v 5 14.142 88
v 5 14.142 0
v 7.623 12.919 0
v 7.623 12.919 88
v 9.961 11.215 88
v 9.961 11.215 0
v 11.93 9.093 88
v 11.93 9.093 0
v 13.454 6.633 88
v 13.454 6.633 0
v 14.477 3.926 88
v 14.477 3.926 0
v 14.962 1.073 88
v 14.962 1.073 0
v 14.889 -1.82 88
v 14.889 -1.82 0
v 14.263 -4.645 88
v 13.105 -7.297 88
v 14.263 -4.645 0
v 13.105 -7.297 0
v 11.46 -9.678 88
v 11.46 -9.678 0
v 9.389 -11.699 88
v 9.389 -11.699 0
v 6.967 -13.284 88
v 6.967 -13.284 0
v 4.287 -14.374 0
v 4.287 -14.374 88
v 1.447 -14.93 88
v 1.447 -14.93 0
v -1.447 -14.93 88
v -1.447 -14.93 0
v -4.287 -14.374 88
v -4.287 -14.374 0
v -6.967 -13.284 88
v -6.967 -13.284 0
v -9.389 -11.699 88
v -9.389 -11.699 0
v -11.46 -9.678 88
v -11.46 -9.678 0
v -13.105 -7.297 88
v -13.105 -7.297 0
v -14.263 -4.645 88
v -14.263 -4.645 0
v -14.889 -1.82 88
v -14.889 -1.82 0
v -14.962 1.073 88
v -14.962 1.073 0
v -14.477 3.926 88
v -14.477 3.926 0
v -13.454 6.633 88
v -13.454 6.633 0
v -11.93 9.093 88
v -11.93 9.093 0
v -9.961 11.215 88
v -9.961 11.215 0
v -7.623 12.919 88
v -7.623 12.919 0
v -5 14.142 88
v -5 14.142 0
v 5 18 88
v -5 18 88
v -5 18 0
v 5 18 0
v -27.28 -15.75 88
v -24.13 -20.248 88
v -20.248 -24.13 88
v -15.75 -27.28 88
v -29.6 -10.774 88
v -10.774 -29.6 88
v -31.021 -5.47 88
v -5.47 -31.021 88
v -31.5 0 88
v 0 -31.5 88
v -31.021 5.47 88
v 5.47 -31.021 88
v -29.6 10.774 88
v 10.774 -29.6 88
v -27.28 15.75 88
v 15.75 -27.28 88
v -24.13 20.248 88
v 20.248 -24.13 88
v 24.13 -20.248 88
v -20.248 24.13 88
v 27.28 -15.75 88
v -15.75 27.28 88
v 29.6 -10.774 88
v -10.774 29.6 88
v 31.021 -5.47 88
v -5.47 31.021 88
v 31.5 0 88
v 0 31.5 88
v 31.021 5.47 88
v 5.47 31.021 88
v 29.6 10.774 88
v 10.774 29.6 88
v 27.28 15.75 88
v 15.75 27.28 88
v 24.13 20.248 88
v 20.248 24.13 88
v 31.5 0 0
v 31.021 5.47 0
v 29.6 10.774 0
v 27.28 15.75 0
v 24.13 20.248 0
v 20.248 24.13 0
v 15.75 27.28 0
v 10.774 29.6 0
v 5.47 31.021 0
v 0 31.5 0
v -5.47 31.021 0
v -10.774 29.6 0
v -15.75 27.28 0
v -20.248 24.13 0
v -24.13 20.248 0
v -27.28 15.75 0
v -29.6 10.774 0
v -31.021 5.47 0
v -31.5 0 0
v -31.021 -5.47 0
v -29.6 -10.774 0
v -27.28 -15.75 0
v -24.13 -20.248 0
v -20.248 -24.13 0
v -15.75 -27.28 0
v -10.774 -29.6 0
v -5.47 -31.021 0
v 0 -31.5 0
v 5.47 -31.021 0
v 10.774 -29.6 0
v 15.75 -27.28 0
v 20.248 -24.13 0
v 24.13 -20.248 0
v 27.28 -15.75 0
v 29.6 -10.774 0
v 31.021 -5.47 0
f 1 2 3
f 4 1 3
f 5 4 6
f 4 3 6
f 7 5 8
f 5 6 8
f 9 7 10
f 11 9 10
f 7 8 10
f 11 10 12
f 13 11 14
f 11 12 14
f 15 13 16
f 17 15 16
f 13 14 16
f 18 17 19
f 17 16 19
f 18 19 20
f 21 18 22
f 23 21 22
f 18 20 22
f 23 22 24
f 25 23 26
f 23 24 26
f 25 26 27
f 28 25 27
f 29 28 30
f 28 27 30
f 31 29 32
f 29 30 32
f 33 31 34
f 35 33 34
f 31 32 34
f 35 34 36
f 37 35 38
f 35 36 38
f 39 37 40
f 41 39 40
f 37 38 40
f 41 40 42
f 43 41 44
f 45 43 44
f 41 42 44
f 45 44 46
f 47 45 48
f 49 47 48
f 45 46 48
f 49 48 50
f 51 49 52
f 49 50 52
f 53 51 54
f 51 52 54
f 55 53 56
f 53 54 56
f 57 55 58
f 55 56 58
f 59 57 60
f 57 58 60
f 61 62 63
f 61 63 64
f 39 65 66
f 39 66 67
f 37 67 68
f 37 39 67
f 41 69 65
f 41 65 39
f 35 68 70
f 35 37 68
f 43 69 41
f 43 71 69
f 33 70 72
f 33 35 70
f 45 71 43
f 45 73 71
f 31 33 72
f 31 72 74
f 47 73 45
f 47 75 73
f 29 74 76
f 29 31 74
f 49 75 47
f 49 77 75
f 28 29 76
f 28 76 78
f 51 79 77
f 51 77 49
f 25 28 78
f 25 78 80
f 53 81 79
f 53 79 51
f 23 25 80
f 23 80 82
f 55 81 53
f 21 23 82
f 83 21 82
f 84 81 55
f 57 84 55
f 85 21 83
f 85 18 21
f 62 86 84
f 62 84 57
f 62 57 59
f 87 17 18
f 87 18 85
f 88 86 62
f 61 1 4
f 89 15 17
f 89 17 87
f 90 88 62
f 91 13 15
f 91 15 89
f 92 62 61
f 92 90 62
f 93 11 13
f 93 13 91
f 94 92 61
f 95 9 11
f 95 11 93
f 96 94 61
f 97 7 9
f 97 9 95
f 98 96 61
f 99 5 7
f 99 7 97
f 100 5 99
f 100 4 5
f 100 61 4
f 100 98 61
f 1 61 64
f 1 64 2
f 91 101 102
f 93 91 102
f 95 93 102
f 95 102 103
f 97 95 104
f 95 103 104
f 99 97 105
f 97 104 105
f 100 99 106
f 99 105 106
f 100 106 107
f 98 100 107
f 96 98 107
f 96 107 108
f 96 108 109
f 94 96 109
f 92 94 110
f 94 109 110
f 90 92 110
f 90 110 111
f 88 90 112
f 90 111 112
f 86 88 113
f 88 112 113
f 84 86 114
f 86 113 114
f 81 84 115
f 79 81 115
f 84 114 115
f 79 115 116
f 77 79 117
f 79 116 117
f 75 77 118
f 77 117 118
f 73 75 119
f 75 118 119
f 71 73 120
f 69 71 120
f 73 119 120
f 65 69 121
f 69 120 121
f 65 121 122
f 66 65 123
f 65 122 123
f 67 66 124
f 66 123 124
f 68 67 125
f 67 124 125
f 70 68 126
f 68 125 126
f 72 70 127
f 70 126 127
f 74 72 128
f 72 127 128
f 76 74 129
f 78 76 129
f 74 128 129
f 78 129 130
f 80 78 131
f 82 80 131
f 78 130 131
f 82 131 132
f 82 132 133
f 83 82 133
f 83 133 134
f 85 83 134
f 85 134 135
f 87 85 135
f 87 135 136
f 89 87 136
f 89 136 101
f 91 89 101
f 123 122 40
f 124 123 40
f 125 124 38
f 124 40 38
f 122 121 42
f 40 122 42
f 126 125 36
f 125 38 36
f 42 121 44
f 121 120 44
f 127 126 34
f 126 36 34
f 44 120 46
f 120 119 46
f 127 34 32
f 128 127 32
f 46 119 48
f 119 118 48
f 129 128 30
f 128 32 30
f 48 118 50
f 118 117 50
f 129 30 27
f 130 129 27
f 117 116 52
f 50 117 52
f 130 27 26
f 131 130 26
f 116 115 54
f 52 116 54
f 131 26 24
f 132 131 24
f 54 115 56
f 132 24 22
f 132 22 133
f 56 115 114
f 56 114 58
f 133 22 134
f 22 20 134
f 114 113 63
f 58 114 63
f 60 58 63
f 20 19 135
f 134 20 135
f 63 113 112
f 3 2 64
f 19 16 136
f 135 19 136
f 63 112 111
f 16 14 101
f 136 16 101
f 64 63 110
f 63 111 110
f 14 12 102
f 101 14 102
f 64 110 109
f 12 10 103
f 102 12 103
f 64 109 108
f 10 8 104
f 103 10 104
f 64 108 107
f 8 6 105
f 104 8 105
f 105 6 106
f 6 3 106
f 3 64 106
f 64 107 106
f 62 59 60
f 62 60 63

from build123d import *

# Parameters (mm, degrees)
SKETCH1_R           = 31.5
BOSS_EXTRUDE1_DEPTH = 88


with BuildPart() as part:
    # Sketch1 → Boss-Extrude1 (new body)
    with BuildSketch(Plane.XY):
        Circle(SKETCH1_R)
        with BuildLine():
            Line((-5, 18), (5, 18))
            Line((5, 18), (5, 14.142135624))
            ThreePointArc((5, 14.142135624), (0, -15), (-5, 14.142135624))
            Line((-5, 14.142135624), (-5, 18))
        make_face(mode=Mode.SUBTRACT)
    extrude(amount=BOSS_EXTRUDE1_DEPTH)


solid = part.part
